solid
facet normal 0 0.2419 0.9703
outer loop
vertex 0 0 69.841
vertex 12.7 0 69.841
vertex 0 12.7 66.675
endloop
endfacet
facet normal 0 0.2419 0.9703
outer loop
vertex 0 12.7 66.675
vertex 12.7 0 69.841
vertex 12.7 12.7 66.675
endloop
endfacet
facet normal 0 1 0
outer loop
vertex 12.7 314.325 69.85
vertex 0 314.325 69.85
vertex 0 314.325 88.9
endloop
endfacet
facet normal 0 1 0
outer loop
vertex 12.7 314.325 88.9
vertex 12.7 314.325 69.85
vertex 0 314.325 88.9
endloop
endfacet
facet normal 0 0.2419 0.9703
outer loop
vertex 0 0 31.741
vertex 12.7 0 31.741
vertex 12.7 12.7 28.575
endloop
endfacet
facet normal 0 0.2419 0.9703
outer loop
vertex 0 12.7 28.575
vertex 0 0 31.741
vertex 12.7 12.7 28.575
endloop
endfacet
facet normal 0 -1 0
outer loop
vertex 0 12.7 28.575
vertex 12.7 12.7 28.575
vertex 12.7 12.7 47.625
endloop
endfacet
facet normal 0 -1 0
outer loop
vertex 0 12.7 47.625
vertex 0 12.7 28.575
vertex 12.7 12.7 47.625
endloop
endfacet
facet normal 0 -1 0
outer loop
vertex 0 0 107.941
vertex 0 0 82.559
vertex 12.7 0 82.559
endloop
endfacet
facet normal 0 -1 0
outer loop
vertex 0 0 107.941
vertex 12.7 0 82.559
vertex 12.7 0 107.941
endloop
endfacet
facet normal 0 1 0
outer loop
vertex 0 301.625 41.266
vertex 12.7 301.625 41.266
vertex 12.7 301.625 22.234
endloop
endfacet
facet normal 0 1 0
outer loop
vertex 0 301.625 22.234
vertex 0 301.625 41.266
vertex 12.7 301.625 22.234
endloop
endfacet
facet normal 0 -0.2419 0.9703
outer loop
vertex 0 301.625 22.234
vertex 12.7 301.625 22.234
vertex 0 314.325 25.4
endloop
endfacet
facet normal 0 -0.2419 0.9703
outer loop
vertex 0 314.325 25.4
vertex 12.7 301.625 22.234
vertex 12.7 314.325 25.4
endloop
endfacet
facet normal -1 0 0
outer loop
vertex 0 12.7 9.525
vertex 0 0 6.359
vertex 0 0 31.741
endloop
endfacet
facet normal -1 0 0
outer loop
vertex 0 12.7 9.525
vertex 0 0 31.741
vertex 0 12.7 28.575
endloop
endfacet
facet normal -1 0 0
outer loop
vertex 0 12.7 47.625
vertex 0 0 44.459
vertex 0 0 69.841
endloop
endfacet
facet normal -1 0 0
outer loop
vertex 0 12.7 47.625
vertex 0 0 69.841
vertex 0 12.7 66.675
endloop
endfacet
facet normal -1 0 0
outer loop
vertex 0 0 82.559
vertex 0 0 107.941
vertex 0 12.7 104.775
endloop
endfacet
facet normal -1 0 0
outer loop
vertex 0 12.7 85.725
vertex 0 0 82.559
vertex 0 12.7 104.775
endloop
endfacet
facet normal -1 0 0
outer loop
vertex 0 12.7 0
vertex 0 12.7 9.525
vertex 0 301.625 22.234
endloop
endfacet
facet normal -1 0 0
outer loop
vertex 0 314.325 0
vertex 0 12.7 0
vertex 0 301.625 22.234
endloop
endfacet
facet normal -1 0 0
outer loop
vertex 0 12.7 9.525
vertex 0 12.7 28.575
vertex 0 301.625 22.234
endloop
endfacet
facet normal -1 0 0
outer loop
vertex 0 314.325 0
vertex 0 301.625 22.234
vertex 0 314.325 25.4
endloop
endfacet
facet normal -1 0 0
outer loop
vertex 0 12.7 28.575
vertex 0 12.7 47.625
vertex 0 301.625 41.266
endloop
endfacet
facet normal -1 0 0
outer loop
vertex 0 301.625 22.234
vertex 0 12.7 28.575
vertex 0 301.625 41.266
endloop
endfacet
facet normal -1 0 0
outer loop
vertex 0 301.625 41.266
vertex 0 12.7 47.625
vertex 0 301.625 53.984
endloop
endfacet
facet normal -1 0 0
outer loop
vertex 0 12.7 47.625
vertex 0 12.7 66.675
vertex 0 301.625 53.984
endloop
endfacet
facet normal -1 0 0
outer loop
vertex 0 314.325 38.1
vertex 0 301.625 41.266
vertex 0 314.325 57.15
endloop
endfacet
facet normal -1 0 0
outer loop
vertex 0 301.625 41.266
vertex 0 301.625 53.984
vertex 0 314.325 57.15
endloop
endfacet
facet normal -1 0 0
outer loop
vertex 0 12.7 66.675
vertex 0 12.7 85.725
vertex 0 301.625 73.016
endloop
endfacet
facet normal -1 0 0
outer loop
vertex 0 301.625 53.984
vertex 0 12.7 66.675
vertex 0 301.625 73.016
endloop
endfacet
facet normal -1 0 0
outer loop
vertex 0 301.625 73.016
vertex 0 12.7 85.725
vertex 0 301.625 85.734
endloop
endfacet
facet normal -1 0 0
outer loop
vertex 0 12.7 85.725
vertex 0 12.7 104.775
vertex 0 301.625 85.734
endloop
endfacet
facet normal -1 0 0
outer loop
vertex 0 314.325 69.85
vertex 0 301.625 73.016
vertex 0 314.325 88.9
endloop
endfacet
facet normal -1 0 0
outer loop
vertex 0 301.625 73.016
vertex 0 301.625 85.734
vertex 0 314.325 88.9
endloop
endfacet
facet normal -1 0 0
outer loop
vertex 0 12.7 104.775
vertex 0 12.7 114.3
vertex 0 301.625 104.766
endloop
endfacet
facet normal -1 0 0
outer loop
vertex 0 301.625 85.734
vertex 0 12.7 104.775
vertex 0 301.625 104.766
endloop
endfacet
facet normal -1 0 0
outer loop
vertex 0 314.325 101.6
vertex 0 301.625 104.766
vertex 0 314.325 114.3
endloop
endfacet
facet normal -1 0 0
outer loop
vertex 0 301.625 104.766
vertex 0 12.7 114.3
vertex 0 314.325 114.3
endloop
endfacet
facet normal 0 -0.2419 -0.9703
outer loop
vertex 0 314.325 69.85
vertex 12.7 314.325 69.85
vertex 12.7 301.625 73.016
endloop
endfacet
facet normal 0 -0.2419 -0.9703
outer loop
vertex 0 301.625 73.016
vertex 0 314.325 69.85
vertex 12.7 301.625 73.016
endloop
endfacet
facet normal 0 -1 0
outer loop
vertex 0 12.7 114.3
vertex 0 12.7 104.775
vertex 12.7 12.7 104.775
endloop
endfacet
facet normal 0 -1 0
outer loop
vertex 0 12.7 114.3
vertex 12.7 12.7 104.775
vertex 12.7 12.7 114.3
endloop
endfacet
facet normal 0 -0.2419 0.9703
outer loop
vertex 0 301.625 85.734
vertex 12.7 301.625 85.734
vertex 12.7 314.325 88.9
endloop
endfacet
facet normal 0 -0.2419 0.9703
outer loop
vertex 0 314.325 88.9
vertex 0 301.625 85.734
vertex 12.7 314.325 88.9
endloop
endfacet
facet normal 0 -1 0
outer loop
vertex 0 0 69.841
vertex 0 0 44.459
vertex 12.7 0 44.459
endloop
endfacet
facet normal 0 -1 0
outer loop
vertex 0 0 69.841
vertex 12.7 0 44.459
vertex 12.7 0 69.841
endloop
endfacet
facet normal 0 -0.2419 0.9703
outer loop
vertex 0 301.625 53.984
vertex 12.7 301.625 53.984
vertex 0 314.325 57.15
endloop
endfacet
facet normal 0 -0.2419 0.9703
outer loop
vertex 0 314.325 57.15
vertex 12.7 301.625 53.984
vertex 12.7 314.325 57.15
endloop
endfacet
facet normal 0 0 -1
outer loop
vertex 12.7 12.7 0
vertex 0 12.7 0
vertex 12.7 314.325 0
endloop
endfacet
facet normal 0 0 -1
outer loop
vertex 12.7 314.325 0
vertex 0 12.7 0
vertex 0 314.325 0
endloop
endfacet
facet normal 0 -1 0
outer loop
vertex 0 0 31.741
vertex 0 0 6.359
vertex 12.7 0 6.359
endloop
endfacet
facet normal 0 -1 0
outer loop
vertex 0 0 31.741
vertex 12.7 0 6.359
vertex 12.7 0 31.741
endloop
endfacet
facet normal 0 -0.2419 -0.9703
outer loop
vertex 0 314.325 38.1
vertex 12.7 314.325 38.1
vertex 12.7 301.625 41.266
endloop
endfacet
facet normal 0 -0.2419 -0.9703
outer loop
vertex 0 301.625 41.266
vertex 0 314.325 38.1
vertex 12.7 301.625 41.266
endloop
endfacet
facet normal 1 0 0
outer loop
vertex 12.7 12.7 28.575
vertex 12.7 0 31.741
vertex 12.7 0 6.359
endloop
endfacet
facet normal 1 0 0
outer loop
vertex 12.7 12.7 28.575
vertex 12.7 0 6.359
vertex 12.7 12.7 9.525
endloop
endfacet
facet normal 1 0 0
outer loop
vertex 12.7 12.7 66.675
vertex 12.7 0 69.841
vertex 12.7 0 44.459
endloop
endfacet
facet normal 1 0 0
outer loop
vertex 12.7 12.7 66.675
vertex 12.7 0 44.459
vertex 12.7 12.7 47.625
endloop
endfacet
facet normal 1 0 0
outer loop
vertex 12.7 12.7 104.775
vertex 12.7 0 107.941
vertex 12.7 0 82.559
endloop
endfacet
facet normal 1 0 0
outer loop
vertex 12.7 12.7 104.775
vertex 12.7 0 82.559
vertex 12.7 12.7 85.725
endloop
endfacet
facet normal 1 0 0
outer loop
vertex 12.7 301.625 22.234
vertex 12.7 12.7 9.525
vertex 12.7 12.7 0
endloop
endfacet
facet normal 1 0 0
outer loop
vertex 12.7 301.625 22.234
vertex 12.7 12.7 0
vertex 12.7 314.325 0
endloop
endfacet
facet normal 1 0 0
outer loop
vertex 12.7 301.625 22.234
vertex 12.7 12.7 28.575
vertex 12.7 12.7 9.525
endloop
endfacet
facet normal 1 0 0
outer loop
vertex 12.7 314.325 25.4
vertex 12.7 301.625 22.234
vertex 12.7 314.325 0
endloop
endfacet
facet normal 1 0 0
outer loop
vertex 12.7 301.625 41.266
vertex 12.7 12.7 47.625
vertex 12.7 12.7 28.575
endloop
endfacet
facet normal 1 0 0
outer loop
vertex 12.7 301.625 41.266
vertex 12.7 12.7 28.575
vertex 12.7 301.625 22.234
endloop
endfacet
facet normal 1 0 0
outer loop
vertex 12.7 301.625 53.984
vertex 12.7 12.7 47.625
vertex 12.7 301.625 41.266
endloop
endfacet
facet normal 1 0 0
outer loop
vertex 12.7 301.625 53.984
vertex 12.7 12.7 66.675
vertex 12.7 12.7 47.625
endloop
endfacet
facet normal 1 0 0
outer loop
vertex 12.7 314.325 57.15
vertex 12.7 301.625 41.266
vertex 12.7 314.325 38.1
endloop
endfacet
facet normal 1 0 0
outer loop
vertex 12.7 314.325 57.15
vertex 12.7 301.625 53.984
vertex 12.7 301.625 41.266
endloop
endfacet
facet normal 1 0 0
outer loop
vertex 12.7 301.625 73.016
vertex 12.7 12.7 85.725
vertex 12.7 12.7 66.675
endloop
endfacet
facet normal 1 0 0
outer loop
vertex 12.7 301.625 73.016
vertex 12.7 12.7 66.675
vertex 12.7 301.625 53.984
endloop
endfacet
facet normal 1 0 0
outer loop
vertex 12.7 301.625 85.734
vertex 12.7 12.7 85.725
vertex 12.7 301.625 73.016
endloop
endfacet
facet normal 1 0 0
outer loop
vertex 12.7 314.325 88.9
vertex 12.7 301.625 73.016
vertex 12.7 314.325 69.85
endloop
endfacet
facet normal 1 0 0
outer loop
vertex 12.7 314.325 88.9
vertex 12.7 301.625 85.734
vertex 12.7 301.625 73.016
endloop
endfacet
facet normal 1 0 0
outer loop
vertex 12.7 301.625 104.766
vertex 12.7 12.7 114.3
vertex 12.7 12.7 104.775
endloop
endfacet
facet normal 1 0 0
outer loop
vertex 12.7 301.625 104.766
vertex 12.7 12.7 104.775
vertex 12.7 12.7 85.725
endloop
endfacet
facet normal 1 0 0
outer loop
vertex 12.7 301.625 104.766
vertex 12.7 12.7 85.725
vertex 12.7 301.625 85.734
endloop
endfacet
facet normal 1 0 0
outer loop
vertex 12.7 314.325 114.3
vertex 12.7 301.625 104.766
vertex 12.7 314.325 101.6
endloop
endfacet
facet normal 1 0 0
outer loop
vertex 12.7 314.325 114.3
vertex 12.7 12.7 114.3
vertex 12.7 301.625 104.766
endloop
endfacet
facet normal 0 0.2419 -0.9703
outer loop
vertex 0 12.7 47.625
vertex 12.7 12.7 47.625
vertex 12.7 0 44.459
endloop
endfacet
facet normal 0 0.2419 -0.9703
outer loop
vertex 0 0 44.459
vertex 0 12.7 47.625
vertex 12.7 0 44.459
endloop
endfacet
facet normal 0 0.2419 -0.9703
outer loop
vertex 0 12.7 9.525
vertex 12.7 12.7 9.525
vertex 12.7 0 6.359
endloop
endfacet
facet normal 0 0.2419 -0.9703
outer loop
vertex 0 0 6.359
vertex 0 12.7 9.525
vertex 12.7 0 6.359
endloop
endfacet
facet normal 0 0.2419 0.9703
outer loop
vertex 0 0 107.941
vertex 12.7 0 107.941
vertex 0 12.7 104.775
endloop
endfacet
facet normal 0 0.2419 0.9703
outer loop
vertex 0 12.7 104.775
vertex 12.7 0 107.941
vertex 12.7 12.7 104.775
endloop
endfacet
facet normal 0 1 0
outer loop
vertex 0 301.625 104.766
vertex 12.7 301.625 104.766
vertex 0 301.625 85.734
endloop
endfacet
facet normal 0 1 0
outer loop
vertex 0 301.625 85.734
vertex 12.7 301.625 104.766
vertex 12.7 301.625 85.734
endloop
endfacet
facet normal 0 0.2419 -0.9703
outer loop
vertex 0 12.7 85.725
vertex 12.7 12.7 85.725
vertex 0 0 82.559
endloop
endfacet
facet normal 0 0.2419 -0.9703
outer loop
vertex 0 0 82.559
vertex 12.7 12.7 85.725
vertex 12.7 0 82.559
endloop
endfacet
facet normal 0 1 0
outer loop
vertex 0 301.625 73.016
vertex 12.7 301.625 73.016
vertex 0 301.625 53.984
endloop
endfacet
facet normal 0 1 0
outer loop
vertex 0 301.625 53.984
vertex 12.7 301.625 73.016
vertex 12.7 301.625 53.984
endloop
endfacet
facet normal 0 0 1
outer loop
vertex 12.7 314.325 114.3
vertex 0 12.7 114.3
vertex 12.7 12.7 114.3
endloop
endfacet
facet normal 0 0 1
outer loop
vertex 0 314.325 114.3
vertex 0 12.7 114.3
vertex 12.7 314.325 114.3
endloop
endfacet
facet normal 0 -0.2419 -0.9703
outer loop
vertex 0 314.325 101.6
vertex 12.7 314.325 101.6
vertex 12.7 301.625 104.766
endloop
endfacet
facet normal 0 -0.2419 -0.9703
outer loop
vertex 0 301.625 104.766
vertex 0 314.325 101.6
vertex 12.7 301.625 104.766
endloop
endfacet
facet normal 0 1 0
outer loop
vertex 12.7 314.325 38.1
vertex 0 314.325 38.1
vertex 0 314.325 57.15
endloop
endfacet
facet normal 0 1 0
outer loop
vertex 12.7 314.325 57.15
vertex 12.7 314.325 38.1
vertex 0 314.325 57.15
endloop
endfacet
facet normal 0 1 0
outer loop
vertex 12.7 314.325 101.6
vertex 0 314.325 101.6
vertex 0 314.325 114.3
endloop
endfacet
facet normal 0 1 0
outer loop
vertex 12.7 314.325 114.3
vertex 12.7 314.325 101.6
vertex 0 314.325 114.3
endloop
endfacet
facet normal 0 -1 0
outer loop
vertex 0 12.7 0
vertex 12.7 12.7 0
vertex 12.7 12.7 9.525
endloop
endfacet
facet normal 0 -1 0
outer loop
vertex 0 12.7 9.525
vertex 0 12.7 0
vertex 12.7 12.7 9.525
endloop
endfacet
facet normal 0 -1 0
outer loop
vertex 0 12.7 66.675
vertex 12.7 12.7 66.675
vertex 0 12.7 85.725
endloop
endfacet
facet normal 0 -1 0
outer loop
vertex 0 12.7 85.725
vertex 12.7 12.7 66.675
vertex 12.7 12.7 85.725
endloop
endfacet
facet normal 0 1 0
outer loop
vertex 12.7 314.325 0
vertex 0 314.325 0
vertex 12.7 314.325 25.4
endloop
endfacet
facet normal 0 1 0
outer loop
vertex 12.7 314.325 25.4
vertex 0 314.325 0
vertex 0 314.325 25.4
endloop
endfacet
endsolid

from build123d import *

# Parameters (mm, degrees)
F0_W     = 314.325
F0_H     = 114.3
F1_DEPTH = 12.7
F3_DEPTH = 12.701


with BuildPart() as f1:
    # F0 (on Right) → F1 (new body)
    with BuildSketch(Plane.YZ):
        with Locations((157.1625, 57.15)):
            Rectangle(F0_W, F0_H)
    extrude(amount=F1_DEPTH)

    # F2 (on face) → F3 (cut, through all)
    with BuildSketch(Plane.YZ.offset(12.7)):
        Polygon((12.7, 9.525), (0, 6.358534), (0, 0), (12.7, 0), align=None)
        Polygon((12.7, 47.625), (0, 44.458534), (0, 31.741466), (12.7, 28.575), align=None)
        Polygon((12.7, 85.725), (0, 82.558534), (0, 69.841466), (12.7, 66.675), align=None)
        Polygon((12.7, 104.775), (12.7, 114.3), (0, 114.3), (0, 107.941466), align=None)
        Polygon((314.325, 88.9), (314.325, 101.6), (301.625, 104.766466), (301.625, 85.733534), align=None)
        Polygon((314.325, 57.15), (314.325, 69.85), (301.625, 73.016466), (301.625, 53.983534), align=None)
        Polygon((314.325, 25.4), (314.325, 38.1), (301.625, 41.266466), (301.625, 22.233534), align=None)
    extrude(amount=-F3_DEPTH, mode=Mode.SUBTRACT)


solid = f1.part
